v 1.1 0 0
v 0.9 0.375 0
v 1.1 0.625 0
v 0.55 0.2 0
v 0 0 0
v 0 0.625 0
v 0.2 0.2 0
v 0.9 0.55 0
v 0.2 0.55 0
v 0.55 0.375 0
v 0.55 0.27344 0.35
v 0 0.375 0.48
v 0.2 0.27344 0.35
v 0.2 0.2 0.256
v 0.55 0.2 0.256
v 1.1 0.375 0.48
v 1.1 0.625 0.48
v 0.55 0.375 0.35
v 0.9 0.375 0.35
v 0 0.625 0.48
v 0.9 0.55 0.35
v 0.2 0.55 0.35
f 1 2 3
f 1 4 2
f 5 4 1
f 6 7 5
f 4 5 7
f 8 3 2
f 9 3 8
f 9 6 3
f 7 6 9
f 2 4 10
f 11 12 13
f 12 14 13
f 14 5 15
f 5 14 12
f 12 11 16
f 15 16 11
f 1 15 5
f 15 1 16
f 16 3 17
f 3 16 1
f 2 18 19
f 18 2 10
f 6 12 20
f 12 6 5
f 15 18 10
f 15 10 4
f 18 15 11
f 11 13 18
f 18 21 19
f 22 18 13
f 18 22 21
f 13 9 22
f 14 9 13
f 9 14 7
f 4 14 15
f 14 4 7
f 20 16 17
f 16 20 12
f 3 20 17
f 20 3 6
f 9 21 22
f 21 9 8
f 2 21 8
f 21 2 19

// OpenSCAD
wedge_length = 0.5; // y-dir
wedge_width = 1.1; // x-dir
wedge_height = 0.48; // z-dir

slot_width = 0.35;
slot_length = 0.2;
slot_height = 0.35;
top_border = wedge_width - 2 * slot_width;

module prism(l, w, h){
polyhedron(
points=[[0,0,0], [l,0,0], [l,w,0], [0,w,0], [0,w,h], [l,w,h]],
faces=[[0,1,2,3],[5,4,3,2],[0,4,5,1],[0,3,4],[5,2,1]]
);
}

difference() {
    prism(wedge_width, wedge_length*.75, wedge_height);
    
    translate([.2, .2, 0]) cube([slot_width, slot_length, slot_height]);
}

// cut the slot using two cubes
difference() {
    translate([0, wedge_length*.75, 0])
    cube([wedge_width, wedge_length/2, wedge_height]);
    
    translate([.2, .15+slot_length, 0]) cube([slot_width, slot_length, slot_height]);
    translate([.2+slot_width, .15+slot_length, 0]) cube([slot_width, slot_length, slot_height]);

}
